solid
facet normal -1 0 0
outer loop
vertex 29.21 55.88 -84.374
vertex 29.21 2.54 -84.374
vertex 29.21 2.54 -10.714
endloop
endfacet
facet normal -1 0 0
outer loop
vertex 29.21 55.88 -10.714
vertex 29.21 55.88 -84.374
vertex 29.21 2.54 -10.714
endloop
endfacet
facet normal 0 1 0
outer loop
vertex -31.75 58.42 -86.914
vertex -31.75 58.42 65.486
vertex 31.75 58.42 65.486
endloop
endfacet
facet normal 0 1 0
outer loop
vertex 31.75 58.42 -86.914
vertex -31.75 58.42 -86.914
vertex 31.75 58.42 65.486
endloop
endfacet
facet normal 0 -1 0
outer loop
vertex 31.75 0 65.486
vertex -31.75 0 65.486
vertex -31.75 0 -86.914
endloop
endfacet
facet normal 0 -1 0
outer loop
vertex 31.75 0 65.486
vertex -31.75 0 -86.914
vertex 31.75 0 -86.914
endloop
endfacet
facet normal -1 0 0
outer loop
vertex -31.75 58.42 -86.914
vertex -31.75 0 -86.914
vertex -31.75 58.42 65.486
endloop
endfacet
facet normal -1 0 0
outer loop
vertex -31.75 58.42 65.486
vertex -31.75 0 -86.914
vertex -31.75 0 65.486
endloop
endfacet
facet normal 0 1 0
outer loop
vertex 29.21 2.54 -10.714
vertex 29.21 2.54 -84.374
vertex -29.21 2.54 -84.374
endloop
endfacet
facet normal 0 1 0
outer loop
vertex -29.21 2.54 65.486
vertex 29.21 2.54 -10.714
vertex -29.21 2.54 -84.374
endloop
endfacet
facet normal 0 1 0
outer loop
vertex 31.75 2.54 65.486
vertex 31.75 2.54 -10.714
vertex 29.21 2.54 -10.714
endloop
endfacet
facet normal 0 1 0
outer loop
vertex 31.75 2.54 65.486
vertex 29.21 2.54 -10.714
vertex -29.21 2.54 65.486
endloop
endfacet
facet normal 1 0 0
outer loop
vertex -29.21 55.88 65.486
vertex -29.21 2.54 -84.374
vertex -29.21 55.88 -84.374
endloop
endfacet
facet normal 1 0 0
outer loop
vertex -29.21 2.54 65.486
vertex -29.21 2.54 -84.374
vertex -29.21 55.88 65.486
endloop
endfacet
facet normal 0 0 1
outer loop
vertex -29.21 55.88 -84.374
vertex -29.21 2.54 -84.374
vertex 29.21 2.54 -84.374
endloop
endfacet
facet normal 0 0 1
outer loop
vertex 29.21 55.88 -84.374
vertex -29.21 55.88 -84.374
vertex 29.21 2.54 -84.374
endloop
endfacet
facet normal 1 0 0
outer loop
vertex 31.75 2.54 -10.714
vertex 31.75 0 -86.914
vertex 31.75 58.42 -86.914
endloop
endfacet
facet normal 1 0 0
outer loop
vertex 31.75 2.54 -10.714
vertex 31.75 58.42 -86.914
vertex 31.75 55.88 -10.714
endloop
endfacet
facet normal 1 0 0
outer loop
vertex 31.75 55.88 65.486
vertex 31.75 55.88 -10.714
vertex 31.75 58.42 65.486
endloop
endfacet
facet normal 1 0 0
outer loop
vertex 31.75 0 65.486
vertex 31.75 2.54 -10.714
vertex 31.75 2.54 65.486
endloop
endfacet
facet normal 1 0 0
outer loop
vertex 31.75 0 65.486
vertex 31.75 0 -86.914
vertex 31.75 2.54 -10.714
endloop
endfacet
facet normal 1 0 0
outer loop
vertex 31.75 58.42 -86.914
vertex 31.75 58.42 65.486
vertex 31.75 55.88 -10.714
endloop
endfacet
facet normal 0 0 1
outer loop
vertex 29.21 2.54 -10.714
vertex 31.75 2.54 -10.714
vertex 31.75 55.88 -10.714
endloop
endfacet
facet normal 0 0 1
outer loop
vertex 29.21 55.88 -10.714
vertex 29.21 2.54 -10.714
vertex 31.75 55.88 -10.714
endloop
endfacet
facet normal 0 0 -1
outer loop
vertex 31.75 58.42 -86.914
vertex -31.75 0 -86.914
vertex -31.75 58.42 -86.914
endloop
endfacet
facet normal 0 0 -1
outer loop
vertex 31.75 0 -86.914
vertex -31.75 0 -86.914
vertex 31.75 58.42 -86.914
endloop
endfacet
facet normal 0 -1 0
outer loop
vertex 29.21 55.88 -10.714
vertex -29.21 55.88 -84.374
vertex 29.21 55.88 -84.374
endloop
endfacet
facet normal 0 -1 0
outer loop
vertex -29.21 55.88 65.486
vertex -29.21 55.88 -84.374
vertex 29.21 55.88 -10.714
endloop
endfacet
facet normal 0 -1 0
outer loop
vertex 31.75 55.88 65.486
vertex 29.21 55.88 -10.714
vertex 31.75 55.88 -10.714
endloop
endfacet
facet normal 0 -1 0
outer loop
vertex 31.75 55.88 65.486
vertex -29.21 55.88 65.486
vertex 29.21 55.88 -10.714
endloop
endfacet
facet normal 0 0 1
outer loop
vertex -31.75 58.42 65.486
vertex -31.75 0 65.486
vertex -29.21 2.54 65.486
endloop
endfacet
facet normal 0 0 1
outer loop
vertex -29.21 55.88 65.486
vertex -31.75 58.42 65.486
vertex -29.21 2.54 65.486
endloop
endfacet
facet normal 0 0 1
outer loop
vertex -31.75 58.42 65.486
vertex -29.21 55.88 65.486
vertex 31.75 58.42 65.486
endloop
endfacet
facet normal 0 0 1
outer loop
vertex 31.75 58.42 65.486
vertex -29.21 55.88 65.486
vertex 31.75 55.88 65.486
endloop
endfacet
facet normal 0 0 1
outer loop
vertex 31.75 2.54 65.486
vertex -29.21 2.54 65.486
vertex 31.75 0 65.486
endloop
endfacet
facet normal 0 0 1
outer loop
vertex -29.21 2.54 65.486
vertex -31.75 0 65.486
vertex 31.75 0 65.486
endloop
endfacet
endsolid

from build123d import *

# Parameters (mm, degrees)
F0_W     = 63.5
F0_H     = 152.4
F1_DEPTH = 58.42
F2_T     = -2.54
F3_W     = 53.34
F3_H     = 76.2
F4_DEPTH = 25.4


with BuildPart() as f1:
    # F0 (on Front) → F1 (new body)
    with BuildSketch(Plane.XZ):
        with Locations((0, -10.713868)):
            Rectangle(F0_W, F0_H)
    extrude(amount=-F1_DEPTH)

    # F2
    f2_openings = [f1.faces().sort_by_distance(p)[0] for p in [
        (0, 29.21, 65.486132),
    ]]
    offset(amount=F2_T, openings=f2_openings)

    # F3 (on face) → F4 (cut)
    with BuildSketch(Plane.YZ.offset(31.75)):
        with Locations((29.21, 27.386132)):
            Rectangle(F3_W, F3_H)
    extrude(amount=-F4_DEPTH, mode=Mode.SUBTRACT)


solid = f1.part
